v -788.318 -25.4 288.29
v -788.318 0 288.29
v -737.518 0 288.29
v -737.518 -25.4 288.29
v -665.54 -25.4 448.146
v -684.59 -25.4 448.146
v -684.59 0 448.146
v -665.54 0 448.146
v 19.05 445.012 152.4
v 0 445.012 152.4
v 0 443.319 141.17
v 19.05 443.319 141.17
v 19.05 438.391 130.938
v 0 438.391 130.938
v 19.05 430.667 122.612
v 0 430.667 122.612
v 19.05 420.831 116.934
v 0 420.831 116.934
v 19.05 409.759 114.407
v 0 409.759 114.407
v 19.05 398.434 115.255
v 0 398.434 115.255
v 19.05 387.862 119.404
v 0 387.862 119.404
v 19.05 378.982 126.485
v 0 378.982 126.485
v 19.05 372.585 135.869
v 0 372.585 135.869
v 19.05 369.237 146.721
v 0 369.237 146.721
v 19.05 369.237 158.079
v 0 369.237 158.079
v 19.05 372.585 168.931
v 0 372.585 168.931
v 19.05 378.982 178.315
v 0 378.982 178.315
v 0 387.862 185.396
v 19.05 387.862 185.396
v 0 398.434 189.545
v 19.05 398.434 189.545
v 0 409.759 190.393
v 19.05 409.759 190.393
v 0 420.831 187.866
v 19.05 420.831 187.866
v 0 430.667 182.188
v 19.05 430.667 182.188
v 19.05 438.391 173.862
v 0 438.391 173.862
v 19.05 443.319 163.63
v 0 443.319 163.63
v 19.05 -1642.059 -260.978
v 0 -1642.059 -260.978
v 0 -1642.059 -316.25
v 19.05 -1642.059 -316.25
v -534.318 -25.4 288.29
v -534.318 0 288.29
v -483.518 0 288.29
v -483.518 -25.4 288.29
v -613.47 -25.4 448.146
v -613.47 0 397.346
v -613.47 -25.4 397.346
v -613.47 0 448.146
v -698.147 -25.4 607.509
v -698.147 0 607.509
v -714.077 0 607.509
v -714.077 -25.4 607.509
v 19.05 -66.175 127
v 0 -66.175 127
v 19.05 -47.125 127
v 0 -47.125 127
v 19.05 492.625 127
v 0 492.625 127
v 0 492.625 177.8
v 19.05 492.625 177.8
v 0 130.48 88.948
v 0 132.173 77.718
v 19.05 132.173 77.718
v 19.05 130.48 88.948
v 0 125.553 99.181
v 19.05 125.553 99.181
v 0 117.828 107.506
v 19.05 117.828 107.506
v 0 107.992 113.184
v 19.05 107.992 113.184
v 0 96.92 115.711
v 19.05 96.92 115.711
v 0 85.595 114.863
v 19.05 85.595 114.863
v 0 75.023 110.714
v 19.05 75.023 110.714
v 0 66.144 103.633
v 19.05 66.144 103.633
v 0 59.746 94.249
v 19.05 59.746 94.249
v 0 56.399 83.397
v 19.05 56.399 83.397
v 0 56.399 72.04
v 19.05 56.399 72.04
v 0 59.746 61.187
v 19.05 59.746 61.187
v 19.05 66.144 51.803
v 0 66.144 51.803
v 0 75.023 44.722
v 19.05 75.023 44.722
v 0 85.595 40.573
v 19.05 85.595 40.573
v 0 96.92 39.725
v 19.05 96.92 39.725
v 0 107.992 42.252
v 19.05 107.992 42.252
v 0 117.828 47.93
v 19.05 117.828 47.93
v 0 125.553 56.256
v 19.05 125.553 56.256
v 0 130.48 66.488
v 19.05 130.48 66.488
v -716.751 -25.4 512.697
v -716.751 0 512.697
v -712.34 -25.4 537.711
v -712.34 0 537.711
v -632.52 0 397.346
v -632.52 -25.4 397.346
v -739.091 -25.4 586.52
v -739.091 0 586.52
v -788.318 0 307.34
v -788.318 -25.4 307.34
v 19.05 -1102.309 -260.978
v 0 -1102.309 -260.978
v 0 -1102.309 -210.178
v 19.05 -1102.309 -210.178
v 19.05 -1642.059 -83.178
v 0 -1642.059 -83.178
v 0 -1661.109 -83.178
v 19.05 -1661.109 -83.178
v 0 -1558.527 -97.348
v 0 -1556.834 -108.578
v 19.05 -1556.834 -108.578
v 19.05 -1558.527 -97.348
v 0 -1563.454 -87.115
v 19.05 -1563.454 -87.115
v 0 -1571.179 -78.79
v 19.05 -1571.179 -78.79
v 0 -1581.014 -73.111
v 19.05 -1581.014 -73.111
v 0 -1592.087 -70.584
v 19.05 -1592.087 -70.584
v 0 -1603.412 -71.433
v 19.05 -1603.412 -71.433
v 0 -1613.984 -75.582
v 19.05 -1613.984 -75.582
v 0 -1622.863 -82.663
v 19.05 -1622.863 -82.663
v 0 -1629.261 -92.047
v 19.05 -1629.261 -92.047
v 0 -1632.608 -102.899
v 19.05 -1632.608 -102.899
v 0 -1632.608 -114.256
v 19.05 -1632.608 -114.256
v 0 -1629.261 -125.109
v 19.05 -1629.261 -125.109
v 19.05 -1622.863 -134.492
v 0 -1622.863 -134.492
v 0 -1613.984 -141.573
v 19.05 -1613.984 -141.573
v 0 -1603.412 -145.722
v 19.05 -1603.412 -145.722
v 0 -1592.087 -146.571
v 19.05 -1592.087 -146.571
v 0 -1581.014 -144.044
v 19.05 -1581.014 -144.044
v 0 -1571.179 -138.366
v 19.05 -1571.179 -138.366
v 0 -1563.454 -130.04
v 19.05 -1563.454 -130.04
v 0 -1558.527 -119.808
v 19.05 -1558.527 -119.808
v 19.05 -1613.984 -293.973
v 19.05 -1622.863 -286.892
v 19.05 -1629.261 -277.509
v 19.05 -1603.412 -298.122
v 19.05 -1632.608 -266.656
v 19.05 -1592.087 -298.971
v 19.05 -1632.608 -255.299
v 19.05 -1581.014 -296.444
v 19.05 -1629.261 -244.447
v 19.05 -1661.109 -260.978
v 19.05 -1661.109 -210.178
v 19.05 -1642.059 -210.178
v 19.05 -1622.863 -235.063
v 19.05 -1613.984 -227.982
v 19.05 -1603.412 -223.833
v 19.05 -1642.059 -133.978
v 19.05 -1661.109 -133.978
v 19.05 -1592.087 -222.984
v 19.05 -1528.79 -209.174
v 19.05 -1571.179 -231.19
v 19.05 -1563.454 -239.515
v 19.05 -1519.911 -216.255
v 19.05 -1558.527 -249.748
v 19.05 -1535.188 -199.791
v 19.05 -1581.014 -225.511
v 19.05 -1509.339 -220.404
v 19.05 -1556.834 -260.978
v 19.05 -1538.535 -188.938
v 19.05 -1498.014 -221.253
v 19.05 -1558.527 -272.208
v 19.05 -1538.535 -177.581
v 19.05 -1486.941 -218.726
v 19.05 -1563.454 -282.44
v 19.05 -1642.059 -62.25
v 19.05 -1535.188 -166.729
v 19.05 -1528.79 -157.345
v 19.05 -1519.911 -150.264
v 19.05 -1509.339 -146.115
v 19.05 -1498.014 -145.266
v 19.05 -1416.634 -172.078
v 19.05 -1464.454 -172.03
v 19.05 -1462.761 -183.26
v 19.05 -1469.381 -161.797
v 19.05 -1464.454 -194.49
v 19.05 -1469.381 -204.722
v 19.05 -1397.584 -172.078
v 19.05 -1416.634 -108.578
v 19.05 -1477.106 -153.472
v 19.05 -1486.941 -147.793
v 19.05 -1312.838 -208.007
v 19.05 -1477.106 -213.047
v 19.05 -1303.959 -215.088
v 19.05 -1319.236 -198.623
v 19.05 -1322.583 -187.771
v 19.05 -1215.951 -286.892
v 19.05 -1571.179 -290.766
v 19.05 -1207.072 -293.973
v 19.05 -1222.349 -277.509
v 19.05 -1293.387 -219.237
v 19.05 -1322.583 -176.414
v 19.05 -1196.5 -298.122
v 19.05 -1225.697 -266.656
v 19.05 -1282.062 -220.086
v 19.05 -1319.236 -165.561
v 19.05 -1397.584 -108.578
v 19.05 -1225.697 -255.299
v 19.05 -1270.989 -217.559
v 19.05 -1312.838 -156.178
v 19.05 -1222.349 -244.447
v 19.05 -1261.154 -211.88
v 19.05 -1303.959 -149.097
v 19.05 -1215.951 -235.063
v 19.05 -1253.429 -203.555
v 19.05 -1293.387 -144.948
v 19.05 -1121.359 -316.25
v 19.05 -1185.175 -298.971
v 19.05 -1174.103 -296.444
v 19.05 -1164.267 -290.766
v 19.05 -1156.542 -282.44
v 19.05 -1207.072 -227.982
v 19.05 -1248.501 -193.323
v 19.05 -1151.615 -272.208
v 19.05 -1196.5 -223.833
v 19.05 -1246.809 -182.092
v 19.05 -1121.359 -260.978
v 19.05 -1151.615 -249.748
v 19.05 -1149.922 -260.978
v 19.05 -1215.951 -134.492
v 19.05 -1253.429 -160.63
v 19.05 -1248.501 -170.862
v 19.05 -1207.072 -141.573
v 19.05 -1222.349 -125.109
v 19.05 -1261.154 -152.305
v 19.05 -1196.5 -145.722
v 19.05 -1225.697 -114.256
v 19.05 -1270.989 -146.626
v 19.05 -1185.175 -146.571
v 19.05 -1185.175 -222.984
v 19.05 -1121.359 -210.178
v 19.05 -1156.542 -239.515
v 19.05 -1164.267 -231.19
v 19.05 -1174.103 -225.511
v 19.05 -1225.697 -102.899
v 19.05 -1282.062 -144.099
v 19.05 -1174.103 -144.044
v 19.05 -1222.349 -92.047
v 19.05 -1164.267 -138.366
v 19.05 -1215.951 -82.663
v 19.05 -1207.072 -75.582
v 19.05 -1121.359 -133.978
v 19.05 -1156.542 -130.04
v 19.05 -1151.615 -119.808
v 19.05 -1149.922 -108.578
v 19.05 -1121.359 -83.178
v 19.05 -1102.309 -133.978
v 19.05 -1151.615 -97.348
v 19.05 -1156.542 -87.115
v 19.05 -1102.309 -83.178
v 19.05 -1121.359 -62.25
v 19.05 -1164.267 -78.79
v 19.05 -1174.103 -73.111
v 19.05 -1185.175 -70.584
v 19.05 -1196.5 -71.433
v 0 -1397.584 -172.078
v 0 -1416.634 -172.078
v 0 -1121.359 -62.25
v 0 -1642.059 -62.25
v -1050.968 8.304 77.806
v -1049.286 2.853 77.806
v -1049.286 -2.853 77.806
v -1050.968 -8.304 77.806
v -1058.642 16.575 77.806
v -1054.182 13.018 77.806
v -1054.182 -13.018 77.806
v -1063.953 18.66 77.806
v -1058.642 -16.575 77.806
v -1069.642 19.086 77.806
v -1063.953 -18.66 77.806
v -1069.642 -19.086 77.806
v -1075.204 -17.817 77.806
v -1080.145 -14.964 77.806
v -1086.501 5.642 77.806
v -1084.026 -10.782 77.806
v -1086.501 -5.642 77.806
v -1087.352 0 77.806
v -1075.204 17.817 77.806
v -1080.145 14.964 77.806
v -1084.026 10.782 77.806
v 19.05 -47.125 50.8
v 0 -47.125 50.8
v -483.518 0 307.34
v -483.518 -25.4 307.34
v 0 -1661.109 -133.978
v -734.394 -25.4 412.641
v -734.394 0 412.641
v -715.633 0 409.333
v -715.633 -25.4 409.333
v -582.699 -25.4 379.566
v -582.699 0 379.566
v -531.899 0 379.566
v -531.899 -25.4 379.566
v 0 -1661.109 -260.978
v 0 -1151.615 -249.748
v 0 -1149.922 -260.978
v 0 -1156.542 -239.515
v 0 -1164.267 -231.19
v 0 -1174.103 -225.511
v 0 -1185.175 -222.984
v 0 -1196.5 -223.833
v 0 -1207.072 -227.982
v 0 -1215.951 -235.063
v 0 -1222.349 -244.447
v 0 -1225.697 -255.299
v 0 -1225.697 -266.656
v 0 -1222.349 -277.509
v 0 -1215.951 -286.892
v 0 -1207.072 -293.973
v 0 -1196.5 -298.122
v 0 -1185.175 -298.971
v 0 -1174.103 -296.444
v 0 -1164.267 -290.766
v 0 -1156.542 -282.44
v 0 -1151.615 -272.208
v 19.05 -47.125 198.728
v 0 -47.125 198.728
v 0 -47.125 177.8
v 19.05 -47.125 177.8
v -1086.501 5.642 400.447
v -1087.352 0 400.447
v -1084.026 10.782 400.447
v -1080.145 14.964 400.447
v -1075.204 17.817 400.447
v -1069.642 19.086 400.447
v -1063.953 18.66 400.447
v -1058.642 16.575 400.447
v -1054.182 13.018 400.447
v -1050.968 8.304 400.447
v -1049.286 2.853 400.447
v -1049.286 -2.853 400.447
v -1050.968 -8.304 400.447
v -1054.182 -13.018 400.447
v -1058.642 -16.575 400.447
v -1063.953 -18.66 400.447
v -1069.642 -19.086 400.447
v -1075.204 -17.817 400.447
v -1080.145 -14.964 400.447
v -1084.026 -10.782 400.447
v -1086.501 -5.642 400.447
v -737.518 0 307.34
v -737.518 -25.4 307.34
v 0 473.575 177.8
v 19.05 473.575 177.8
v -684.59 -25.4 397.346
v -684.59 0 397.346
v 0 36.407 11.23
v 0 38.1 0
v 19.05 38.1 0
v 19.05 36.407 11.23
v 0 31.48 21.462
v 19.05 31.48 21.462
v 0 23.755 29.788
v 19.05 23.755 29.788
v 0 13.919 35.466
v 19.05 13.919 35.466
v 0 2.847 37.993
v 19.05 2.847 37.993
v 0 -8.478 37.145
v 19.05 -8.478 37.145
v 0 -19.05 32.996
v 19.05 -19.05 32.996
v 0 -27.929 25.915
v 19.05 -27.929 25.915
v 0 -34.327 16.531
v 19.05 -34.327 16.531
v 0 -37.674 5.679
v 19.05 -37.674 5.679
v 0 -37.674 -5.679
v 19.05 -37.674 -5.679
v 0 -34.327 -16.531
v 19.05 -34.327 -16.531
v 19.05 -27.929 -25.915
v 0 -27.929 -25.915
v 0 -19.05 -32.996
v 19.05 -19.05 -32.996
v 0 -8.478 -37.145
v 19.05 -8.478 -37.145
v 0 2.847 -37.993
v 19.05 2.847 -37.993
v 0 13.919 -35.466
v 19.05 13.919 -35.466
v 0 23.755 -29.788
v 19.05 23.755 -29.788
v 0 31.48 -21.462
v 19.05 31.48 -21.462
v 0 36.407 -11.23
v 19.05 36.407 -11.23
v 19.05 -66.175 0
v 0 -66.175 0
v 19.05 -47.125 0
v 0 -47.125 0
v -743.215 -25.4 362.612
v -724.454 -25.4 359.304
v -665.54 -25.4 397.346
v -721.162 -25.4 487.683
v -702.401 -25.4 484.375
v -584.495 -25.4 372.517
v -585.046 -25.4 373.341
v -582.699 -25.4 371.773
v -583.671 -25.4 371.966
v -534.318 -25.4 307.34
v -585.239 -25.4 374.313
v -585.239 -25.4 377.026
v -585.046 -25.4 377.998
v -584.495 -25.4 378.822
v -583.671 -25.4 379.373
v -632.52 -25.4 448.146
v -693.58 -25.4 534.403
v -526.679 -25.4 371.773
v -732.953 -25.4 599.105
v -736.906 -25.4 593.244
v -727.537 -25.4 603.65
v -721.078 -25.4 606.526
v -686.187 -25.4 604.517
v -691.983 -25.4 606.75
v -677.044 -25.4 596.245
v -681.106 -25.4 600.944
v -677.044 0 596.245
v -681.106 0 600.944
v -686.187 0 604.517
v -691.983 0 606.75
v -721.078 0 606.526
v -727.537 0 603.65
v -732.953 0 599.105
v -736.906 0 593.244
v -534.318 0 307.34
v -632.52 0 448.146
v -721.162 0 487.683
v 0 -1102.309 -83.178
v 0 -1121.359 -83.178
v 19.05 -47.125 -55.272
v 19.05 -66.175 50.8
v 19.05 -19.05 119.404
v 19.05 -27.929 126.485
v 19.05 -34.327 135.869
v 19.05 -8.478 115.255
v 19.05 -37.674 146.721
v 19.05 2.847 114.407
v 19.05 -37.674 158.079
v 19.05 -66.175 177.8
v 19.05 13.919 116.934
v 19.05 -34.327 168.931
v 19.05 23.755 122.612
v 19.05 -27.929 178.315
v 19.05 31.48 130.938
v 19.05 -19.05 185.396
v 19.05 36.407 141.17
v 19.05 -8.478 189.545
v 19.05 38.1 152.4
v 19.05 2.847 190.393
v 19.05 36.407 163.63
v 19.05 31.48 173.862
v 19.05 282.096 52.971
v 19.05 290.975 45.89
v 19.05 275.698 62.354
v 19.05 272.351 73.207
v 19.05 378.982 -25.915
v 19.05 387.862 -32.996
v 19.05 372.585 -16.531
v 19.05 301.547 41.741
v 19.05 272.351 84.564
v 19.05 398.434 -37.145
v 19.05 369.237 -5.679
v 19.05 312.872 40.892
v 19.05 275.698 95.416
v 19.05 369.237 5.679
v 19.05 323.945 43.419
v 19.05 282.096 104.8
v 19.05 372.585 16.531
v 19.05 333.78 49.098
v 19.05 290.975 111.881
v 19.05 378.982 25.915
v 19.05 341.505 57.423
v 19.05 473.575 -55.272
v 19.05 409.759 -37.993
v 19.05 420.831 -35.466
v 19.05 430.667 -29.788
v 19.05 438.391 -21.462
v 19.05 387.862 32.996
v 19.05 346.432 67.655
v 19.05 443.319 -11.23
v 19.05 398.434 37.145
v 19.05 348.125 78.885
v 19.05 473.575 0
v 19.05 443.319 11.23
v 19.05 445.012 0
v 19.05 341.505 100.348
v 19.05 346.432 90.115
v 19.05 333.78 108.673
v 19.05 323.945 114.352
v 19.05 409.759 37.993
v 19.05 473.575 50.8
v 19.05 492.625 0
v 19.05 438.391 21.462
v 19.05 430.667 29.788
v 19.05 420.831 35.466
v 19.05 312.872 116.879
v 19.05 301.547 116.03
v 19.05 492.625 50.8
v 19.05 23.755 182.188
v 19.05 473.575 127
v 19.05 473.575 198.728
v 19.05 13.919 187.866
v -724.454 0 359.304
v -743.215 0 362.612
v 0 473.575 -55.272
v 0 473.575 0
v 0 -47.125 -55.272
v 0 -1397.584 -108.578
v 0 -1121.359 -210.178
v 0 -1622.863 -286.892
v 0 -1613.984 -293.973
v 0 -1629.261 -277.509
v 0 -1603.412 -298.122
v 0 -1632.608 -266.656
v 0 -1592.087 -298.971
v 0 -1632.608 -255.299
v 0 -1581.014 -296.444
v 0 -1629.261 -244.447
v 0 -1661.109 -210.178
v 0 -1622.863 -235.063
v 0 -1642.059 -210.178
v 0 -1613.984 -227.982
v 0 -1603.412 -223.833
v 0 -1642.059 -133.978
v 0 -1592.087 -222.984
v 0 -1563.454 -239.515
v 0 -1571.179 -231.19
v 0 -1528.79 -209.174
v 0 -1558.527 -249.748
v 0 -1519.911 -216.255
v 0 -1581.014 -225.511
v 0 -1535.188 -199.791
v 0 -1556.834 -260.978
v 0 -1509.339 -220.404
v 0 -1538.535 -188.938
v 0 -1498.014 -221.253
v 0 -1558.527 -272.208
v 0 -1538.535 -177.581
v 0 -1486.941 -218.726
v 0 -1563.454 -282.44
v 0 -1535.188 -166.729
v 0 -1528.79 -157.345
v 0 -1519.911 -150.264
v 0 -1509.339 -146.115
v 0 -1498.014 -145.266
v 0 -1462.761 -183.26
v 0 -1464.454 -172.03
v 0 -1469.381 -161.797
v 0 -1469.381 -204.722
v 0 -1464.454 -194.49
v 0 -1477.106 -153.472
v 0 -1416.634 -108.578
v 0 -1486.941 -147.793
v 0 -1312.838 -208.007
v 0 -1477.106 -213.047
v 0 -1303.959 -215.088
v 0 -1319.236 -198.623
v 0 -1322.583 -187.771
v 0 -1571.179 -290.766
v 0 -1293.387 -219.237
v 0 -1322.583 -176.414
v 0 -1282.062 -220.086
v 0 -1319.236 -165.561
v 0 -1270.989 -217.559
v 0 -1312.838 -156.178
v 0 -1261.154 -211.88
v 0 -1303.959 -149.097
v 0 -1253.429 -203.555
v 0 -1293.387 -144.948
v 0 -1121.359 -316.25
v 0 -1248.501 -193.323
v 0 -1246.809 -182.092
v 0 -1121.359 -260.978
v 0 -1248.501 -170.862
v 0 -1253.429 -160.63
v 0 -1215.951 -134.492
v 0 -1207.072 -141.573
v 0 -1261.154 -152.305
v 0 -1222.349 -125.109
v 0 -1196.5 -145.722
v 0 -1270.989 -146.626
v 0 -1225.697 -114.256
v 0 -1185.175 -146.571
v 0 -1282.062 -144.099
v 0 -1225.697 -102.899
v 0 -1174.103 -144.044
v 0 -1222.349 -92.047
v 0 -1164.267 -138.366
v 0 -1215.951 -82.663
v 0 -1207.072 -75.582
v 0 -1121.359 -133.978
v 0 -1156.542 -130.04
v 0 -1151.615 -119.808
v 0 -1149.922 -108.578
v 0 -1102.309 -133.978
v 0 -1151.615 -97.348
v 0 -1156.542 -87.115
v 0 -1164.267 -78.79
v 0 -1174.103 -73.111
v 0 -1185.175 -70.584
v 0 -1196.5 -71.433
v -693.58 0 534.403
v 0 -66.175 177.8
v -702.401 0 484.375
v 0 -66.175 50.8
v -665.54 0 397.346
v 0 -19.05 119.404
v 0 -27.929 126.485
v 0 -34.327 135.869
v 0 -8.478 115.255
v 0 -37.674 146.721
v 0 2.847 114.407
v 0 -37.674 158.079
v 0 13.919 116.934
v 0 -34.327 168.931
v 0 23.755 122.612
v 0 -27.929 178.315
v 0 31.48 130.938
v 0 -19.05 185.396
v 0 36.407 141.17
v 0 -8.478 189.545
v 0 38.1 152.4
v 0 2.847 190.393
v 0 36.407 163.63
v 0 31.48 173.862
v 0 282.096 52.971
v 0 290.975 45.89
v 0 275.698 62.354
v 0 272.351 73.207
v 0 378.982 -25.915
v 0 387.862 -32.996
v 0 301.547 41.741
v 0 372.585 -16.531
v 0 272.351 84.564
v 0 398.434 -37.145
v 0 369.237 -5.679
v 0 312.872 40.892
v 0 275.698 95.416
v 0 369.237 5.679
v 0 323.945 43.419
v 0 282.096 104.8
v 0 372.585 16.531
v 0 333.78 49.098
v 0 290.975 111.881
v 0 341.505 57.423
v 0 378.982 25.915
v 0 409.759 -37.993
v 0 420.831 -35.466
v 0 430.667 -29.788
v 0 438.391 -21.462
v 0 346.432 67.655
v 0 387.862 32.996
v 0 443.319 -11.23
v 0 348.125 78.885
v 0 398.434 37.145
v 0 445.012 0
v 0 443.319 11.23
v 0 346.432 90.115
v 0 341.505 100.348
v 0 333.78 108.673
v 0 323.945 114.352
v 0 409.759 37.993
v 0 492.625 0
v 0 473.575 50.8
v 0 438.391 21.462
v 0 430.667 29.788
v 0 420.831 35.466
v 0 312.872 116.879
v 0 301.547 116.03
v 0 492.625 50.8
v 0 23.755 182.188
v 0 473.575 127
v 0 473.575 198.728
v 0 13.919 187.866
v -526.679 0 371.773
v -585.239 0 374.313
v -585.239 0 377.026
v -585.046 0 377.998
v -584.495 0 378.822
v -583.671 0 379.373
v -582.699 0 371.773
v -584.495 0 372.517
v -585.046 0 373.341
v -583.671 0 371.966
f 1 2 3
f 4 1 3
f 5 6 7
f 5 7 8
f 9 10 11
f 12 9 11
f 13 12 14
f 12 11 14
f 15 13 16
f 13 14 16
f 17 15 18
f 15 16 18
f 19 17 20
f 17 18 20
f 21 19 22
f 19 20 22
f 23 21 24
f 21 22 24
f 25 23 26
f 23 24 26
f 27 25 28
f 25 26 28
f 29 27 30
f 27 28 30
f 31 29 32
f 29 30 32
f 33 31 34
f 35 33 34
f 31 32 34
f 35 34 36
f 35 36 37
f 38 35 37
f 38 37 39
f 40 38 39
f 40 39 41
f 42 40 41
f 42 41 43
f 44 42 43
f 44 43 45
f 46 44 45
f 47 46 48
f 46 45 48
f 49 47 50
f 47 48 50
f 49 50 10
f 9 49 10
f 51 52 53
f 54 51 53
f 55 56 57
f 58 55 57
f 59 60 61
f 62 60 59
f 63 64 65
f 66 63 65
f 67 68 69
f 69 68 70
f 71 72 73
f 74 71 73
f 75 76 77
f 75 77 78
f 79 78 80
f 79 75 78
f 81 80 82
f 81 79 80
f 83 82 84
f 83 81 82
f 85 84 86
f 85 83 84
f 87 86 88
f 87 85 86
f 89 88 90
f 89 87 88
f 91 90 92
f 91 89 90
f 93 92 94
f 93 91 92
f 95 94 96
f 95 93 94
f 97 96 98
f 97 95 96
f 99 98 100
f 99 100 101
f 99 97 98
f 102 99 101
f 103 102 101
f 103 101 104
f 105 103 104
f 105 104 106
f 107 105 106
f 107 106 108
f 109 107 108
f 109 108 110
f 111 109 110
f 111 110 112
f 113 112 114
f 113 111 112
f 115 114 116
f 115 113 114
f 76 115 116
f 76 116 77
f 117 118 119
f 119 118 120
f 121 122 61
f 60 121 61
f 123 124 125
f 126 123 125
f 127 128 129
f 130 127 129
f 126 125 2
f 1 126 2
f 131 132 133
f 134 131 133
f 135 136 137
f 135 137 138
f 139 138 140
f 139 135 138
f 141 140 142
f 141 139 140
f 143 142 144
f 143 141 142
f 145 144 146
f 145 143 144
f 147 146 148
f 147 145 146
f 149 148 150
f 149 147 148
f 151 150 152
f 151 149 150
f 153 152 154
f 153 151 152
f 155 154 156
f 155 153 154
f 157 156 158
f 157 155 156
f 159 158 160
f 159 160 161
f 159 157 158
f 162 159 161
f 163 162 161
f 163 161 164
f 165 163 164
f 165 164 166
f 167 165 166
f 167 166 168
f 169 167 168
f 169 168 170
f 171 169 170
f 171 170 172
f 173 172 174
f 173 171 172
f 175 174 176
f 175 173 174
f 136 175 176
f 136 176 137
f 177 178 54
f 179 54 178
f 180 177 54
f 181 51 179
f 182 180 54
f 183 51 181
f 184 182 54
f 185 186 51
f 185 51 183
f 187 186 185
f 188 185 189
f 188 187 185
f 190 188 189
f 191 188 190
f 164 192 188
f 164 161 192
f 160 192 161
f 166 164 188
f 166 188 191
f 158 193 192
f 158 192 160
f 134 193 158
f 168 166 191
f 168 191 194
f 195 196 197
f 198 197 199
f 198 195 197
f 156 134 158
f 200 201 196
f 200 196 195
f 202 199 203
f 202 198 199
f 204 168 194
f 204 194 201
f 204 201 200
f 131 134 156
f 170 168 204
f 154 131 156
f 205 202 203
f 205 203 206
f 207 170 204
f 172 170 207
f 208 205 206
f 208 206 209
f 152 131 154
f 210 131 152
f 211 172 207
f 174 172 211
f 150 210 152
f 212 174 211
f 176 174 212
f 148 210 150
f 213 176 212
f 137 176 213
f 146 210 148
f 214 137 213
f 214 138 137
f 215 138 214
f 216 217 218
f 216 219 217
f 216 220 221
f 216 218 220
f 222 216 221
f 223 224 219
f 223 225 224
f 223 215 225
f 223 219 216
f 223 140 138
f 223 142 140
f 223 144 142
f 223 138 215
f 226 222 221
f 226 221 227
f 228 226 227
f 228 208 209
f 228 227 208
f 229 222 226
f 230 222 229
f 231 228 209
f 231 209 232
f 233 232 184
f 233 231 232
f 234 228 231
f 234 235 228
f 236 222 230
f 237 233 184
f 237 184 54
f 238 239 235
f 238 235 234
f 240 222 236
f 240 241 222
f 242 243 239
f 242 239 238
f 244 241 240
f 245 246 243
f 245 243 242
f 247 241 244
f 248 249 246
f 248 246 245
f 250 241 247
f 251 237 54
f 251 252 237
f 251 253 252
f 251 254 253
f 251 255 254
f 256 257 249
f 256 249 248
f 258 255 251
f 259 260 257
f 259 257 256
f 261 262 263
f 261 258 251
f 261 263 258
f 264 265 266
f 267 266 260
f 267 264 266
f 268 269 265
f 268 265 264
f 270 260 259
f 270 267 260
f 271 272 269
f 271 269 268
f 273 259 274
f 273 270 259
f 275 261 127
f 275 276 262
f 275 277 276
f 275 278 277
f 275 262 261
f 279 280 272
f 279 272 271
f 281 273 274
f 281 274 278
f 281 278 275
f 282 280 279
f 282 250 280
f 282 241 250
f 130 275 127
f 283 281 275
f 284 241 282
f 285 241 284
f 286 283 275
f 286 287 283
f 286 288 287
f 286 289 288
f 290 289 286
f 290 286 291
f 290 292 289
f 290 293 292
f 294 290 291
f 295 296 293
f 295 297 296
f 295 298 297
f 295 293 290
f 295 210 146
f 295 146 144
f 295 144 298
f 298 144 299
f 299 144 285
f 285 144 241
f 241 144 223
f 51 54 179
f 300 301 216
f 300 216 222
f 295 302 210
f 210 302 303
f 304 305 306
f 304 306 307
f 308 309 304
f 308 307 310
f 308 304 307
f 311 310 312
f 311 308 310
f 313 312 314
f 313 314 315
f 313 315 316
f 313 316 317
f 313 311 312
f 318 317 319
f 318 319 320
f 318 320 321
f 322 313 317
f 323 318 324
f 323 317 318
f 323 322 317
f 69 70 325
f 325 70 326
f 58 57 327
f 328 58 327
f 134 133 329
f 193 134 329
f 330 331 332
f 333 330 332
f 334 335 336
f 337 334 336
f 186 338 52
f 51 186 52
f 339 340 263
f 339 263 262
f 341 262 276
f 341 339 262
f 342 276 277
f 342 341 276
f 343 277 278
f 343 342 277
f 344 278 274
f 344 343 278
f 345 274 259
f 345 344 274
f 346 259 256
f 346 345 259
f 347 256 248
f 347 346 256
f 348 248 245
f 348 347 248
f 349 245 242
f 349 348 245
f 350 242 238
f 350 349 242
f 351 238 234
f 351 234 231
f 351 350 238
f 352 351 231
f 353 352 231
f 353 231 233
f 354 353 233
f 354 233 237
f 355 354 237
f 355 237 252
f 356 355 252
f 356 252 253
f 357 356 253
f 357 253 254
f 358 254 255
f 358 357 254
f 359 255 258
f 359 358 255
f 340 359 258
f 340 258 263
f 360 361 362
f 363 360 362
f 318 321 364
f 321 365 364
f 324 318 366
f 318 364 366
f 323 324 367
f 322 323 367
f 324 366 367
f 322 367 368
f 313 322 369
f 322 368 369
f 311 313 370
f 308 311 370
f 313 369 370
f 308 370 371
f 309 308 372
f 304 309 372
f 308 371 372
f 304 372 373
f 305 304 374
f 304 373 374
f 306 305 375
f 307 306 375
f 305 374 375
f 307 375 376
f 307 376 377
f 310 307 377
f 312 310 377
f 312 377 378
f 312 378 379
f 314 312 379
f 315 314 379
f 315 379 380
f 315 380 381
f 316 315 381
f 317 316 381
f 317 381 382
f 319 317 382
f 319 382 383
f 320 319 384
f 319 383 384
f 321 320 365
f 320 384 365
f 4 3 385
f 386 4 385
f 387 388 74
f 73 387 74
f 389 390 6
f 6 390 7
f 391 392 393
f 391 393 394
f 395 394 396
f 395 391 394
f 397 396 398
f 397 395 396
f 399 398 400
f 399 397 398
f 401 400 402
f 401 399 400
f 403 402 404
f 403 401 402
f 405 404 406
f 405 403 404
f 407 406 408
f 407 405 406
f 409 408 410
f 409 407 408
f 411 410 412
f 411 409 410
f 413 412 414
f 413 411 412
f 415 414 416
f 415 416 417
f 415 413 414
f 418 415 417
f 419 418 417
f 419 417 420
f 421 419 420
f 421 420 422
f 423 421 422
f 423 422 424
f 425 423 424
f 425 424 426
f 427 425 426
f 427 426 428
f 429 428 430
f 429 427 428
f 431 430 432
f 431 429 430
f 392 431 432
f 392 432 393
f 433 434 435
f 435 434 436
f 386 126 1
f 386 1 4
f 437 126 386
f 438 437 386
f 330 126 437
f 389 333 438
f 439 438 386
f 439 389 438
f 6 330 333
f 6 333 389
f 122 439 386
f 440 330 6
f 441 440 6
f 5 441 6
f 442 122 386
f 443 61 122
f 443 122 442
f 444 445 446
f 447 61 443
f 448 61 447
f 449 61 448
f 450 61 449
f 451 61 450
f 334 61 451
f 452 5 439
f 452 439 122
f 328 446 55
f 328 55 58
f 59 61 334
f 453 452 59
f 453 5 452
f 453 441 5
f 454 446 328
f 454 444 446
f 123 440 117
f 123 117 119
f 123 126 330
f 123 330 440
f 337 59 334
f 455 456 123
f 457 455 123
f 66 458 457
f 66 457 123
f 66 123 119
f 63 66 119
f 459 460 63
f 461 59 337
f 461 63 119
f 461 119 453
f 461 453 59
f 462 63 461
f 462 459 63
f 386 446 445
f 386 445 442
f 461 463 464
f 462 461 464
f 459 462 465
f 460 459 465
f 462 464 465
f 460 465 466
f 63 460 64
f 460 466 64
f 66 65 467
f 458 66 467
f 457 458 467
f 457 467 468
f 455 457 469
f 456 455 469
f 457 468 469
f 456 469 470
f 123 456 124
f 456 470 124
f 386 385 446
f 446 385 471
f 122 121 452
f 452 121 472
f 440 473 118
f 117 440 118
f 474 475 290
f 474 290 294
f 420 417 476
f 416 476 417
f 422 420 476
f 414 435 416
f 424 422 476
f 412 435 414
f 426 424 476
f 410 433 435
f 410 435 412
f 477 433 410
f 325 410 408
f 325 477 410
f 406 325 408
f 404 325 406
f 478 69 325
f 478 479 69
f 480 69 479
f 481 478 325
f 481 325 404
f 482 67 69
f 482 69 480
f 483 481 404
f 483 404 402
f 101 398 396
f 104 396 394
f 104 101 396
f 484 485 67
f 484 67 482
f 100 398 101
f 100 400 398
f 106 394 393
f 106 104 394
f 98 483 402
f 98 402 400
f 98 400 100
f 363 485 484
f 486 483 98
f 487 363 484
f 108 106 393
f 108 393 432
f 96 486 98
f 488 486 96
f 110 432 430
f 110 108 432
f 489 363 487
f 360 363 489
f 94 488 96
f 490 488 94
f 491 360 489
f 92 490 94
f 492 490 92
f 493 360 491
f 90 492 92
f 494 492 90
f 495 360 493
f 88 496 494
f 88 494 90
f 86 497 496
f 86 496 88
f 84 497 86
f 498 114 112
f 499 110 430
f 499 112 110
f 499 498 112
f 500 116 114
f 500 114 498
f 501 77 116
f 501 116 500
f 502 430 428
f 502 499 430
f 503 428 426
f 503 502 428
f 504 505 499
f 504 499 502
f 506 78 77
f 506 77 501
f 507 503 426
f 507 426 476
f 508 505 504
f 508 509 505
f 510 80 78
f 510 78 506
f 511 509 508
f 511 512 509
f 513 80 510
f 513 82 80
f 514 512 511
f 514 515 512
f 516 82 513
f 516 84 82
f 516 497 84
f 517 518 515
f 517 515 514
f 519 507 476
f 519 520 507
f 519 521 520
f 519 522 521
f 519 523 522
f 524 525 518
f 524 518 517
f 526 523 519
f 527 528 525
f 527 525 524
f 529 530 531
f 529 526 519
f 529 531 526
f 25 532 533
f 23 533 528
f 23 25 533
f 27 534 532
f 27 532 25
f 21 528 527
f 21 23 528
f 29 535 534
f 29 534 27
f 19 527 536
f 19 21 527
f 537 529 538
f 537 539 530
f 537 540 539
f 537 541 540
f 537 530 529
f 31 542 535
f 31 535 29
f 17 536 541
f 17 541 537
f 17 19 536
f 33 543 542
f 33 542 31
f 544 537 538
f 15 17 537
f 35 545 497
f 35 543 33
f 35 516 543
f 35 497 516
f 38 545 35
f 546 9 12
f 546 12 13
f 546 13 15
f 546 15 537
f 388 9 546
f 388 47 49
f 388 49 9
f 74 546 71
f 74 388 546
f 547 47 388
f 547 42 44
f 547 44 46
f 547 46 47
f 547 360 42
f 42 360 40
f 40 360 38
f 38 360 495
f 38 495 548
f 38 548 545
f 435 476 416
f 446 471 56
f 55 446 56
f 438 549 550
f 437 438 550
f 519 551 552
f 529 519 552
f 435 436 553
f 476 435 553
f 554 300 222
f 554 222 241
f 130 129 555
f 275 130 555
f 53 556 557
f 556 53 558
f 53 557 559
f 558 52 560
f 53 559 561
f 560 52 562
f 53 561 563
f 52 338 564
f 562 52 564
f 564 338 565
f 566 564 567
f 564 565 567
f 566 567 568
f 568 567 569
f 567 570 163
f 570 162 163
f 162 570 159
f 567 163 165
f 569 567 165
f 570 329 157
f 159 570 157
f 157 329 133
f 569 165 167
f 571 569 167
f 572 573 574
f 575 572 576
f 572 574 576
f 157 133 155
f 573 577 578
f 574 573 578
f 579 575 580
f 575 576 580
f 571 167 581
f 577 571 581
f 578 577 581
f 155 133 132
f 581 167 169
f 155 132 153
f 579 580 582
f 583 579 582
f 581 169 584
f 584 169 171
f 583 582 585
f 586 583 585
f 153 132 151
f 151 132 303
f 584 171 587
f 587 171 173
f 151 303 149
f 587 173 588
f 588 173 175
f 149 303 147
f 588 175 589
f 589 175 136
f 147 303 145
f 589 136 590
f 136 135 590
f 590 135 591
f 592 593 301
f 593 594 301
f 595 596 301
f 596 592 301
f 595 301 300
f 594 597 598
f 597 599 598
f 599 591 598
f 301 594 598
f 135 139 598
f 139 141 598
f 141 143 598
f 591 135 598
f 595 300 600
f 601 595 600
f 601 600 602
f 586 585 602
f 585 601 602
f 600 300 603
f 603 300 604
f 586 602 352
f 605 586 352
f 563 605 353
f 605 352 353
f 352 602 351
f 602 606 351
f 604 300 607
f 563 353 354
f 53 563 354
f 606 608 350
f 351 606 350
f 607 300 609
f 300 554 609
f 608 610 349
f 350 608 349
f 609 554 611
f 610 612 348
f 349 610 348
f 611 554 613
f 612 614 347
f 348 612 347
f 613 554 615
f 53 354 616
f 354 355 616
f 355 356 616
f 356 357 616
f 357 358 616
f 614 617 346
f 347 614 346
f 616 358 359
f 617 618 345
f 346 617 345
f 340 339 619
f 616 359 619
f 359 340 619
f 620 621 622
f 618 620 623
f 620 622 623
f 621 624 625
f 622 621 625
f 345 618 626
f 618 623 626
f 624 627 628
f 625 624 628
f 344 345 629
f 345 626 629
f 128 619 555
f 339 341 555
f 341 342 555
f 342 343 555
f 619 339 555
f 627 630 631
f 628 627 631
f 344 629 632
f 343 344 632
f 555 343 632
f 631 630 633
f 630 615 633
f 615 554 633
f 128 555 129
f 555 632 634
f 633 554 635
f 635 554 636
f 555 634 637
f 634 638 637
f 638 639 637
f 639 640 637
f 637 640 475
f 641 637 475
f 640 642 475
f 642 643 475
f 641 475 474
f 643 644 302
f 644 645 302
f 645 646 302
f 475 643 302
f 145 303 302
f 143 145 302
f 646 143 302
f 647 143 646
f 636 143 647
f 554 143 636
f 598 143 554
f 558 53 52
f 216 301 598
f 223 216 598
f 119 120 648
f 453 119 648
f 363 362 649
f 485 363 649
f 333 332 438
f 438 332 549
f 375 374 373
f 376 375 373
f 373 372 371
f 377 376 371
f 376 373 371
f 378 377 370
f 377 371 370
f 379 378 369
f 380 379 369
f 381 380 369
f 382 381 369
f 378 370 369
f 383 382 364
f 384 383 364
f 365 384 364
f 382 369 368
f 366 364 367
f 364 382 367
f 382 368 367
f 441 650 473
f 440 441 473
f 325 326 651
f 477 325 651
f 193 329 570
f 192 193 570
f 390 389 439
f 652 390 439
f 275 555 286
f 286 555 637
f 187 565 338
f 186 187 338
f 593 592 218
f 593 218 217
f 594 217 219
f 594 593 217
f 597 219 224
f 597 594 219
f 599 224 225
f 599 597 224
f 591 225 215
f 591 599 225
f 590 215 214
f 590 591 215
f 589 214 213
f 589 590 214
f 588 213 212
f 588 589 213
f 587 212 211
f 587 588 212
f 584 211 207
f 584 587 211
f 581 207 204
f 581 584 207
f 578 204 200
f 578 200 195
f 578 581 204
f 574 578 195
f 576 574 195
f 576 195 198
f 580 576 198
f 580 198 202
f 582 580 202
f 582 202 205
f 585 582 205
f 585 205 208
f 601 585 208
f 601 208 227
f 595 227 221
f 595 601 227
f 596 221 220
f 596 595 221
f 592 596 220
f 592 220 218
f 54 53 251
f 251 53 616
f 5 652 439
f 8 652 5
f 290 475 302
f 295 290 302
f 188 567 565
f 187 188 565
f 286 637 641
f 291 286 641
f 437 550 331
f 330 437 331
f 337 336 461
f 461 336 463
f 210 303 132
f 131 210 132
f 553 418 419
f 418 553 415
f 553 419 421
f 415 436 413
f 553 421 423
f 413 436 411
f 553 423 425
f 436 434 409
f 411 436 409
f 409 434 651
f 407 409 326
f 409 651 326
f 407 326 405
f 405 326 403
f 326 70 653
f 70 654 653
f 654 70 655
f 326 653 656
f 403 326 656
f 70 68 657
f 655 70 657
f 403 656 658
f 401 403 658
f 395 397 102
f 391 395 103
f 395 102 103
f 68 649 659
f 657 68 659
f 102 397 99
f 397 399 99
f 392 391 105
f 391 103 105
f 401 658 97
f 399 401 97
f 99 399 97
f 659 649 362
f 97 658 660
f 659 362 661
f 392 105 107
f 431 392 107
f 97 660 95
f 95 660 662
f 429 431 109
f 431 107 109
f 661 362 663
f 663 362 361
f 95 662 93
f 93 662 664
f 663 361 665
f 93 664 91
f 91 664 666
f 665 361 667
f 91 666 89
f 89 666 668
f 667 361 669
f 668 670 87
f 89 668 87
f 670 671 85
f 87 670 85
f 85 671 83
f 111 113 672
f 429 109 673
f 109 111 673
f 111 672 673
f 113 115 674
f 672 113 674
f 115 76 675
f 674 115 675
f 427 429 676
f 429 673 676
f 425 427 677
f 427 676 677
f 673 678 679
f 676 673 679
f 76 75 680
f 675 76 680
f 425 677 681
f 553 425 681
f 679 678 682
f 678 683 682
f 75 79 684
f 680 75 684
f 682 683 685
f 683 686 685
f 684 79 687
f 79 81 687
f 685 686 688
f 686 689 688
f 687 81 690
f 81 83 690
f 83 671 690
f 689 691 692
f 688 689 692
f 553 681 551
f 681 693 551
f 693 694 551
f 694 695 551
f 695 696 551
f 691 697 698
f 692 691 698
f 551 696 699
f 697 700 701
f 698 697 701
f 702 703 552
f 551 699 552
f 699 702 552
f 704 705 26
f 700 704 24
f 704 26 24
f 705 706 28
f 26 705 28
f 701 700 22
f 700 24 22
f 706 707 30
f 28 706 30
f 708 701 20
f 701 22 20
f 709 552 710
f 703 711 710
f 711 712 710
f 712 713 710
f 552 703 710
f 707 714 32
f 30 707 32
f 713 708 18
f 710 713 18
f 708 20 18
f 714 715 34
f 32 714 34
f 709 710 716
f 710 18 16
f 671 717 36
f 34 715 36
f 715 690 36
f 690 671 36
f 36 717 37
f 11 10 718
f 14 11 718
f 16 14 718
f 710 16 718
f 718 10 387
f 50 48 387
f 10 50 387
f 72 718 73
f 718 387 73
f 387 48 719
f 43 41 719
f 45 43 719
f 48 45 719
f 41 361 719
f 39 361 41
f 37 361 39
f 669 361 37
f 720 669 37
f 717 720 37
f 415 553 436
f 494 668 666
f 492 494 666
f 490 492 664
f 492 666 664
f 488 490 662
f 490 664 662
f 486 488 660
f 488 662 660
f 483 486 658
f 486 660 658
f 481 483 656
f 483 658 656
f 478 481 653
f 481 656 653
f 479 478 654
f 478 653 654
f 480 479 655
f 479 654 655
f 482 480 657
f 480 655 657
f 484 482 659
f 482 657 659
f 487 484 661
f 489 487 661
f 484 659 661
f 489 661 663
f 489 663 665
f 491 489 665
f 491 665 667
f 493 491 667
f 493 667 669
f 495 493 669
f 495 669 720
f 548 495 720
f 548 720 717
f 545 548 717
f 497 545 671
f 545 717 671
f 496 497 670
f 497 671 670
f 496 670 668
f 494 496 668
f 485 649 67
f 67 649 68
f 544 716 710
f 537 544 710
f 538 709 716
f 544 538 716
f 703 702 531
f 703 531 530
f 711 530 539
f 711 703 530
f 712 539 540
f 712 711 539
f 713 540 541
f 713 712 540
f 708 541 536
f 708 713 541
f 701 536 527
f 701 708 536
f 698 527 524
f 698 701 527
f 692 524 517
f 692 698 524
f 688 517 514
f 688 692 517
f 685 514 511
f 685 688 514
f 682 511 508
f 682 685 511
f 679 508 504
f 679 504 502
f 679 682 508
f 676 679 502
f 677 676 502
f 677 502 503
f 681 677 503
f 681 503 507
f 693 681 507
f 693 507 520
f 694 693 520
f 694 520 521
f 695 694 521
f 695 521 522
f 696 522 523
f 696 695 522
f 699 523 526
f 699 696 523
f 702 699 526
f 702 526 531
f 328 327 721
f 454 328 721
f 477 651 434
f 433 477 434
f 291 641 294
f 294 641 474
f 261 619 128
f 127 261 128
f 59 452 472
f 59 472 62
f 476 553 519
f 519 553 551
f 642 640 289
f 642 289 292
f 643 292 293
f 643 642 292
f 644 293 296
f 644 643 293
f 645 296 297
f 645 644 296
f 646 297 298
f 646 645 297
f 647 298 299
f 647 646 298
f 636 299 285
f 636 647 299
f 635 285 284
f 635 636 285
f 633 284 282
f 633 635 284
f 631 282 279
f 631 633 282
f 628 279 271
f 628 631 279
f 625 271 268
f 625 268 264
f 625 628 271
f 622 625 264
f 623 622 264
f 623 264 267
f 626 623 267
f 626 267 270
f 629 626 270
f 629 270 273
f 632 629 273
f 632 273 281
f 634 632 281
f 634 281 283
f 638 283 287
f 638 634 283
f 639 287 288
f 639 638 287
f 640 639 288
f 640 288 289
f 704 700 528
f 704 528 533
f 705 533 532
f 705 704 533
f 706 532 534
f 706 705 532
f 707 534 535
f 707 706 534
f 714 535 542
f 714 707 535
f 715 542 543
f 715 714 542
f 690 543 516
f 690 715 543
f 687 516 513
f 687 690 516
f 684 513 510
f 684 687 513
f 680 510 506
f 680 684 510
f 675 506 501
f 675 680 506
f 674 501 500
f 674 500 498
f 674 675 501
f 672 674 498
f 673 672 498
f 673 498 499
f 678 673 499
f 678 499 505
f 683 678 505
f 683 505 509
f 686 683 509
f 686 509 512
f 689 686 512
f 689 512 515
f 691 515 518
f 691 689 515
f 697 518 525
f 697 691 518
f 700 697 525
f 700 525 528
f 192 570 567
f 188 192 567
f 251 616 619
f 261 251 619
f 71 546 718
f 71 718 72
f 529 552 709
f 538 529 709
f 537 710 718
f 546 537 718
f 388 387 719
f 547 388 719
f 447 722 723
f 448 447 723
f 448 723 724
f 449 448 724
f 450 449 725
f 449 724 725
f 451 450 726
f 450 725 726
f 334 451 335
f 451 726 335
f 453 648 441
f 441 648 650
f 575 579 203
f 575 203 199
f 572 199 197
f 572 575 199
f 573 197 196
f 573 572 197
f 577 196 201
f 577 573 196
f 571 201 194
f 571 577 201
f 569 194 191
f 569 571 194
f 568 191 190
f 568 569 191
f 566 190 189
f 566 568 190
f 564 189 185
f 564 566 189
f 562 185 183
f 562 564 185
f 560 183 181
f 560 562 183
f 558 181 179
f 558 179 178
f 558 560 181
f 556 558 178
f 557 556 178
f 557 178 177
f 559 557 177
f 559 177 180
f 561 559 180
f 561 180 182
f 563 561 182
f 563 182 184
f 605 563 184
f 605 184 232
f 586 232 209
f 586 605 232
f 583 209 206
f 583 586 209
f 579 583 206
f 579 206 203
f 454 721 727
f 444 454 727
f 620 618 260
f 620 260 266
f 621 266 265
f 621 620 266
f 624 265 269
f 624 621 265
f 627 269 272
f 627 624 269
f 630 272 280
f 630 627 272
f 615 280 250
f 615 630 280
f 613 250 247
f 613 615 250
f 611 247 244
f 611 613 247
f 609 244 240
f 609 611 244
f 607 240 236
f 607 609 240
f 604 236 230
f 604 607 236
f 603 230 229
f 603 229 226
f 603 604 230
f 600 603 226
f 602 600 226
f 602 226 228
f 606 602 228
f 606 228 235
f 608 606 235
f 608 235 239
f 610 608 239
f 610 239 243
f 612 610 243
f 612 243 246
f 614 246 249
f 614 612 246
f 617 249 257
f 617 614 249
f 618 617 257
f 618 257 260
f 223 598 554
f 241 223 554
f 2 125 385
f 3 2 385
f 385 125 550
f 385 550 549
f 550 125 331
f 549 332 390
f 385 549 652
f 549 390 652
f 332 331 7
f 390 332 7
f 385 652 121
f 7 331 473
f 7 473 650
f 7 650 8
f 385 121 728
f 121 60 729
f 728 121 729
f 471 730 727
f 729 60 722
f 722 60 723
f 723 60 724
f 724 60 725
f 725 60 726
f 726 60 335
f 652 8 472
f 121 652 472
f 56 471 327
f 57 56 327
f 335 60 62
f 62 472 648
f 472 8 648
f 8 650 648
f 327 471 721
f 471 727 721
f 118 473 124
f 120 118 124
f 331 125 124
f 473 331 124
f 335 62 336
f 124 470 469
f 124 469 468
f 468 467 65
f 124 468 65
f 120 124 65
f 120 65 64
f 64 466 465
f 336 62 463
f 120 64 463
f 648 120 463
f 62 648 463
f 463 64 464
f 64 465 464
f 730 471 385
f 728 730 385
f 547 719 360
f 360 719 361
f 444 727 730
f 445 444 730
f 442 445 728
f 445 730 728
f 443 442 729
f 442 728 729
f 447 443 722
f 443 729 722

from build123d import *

# Parameters (mm, degrees)
F2_W     = 19.139648
F2_H     = 322.640807
F0_W     = 19.05
F0_H     = 50.8
F4_DEPTH = 25.4
F1_W     = 19.05
F1_H     = 25.4
F1_R     = 38.1
F1_H_2   = 63.5
F1_H_3   = 50.8
F5_DEPTH = 19.05


with BuildPart() as f3:
    # F2 (on Front) → F3 (revolve)
    with BuildSketch(Plane.XZ):
        with Locations((-1077.781737, 239.126637)):
            Rectangle(F2_W, F2_H)
    revolve(axis=Axis((-1068.211913, 0, 239.126638), (0, 0, -1)))


with BuildPart() as f4:
    # F0 (on Front) → F4 (new body)
    with BuildSketch(Plane.XZ):
        with BuildLine():
            Line((-737.51774, 288.290056), (-737.51774, 307.340056))
            Line((-737.51774, 307.340056), (-534.31774, 307.340056))
            Line((-534.31774, 307.340056), (-534.31774, 288.290056))
            Line((-534.31774, 288.290056), (-483.51774, 288.290056))
            Line((-483.51774, 288.290056), (-483.51774, 307.340056))
            Line((-483.51774, 307.340056), (-526.678775, 371.772796))
            Line((-526.678775, 371.772796), (-582.699424, 371.772796))
            ThreePointArc((-582.699424, 371.772796), (-584.495476, 372.516745), (-585.239424, 374.312796))
            Line((-585.239424, 374.312796), (-585.239424, 377.026416))
            ThreePointArc((-585.239424, 377.026416), (-584.495476, 378.822467), (-582.699424, 379.566416))
            Line((-582.699424, 379.566416), (-557.299424, 379.566416))
            Line((-557.299424, 379.566416), (-531.899424, 379.566416))
            Line((-531.899424, 379.566416), (-677.044472, 596.24549))
            ThreePointArc((-677.044472, 596.24549), (-686.186926, 604.517216), (-698.147378, 607.509459))
            Line((-698.147378, 607.509459), (-714.076645, 607.509459))
            ThreePointArc((-714.076645, 607.509459), (-730.40345, 601.566988), (-739.090762, 586.520123))
            Line((-739.090762, 586.520123), (-788.31774, 307.340056))
            Line((-788.31774, 307.340056), (-788.31774, 288.290056))
            Line((-788.31774, 288.290056), (-737.51774, 288.290056))
        make_face()
        Polygon((-734.393691, 412.640675), (-715.633104, 409.332677), (-724.454431, 359.304443), (-743.215019, 362.612441), align=None, mode=Mode.SUBTRACT)
        with Locations((-675.064775, 422.746406)):
            Rectangle(F0_W, F0_H, mode=Mode.SUBTRACT)
        with Locations((-622.994775, 422.746406)):
            Rectangle(F0_W, F0_H, mode=Mode.SUBTRACT)
        Polygon((-716.751037, 512.697143), (-712.340373, 537.71126), (-693.579785, 534.403262), (-702.401113, 484.375028), (-721.1617, 487.683026), align=None, mode=Mode.SUBTRACT)
    extrude(amount=F4_DEPTH)


with BuildPart() as f5:
    # F1 (on Right) → F5 (new body)
    with BuildSketch(Plane.YZ):
        with BuildLine():
            Line((473.575031, 177.8), (473.575031, 198.727619))
            Line((473.575031, 198.727619), (213.225031, 198.727619))
            Line((213.225031, 198.727619), (213.225031, 152.4))
            Line((213.225031, 152.4), (368.811731, 152.4))
            ThreePointArc((368.811731, 152.4), (406.911731, 190.5), (445.011731, 152.4))
            Line((445.011731, 152.4), (473.575031, 152.4))
            Line((473.575031, 152.4), (473.575031, 177.8))
        make_face()
        with BuildLine():
            Line((213.225031, 152.4), (213.225031, 198.727619))
            Line((213.225031, 198.727619), (-47.124969, 198.727619))
            Line((-47.124969, 198.727619), (-47.124969, 177.8))
            Line((-47.124969, 177.8), (-66.174969, 177.8))
            Line((-66.174969, 177.8), (-66.174969, 152.4))
            Line((-66.174969, 152.4), (-38.1, 152.4))
            ThreePointArc((-38.1, 152.4), (0, 190.5), (38.1, 152.4))
            Line((38.1, 152.4), (213.225031, 152.4))
        make_face()
        with Locations((483.100031, 165.1)):
            Rectangle(F1_W, F1_H)
        with BuildLine():
            Line((368.811731, 152.4), (213.225031, 152.4))
            Line((213.225031, 152.4), (213.225031, -55.272381))
            Line((213.225031, -55.272381), (473.575031, -55.272381))
            Line((473.575031, -55.272381), (473.575031, 0))
            Line((473.575031, 0), (492.625031, 0))
            Line((492.625031, 0), (492.625031, 50.8))
            Line((492.625031, 50.8), (473.575031, 50.8))
            Line((473.575031, 50.8), (473.575031, 127))
            Line((473.575031, 127), (473.575031, 152.4))
            Line((473.575031, 152.4), (445.011731, 152.4))
            ThreePointArc((445.011731, 152.4), (406.911731, 114.3), (368.811731, 152.4))
        make_face()
        with Locations((406.911731, 0)):
            Circle(F1_R, mode=Mode.SUBTRACT)
        with Locations((310.025126, 78.885317)):
            Circle(F1_R, mode=Mode.SUBTRACT)
        with BuildLine():
            Line((213.225031, -55.272381), (213.225031, 152.4))
            Line((213.225031, 152.4), (38.1, 152.4))
            ThreePointArc((38.1, 152.4), (0, 114.3), (-38.1, 152.4))
            Line((-38.1, 152.4), (-66.174969, 152.4))
            Line((-66.174969, 152.4), (-66.174969, 127))
            Line((-66.174969, 127), (-47.124969, 127))
            Line((-47.124969, 127), (-47.124969, 50.8))
            Line((-47.124969, 50.8), (-66.174969, 50.8))
            Line((-66.174969, 50.8), (-66.174969, 0))
            Line((-66.174969, 0), (-47.124969, 0))
            Line((-47.124969, 0), (-47.124969, -55.272381))
            Line((-47.124969, -55.272381), (213.225031, -55.272381))
        make_face()
        Circle(F1_R, mode=Mode.SUBTRACT)
        with Locations((94.07299, 77.718012)):
            Circle(F1_R, mode=Mode.SUBTRACT)
        with Locations((483.100031, 139.7)):
            Rectangle(F1_W, F1_H)
        Polygon((-1121.358874, -83.177725), (-1121.358874, -62.250106), (-1381.708874, -62.250106), (-1381.708874, -316.250106), (-1121.358874, -316.250106), (-1121.358874, -260.977725), (-1102.308874, -260.977725), (-1102.308874, -210.177725), (-1121.358874, -210.177725), (-1121.358874, -133.977725), align=None)
        with Locations((-1188.022175, -260.977725)):
            Circle(F1_R, mode=Mode.SUBTRACT)
        with Locations((-1284.90878, -182.092408)):
            Circle(F1_R, mode=Mode.SUBTRACT)
        with Locations((-1188.022175, -108.577725)):
            Circle(F1_R, mode=Mode.SUBTRACT)
        Polygon((-1381.708874, -316.250106), (-1381.708874, -62.250106), (-1642.058874, -62.250106), (-1642.058874, -83.177725), (-1661.108874, -83.177725), (-1661.108874, -133.977725), (-1642.058874, -133.977725), (-1642.058874, -210.177725), (-1661.108874, -210.177725), (-1661.108874, -260.977725), (-1642.058874, -260.977725), (-1642.058874, -316.250106), align=None)
        with Locations((-1594.933906, -260.977725)):
            Circle(F1_R, mode=Mode.SUBTRACT)
        with Locations((-1500.860915, -183.259713)):
            Circle(F1_R, mode=Mode.SUBTRACT)
        with Locations((-1407.108725, -140.32773)):
            Rectangle(F1_W, F1_H_2, mode=Mode.SUBTRACT)
        with Locations((-1594.933906, -108.577725)):
            Circle(F1_R, mode=Mode.SUBTRACT)
        with Locations((-1111.833874, -108.577725)):
            Rectangle(F1_W, F1_H_3)
    extrude(amount=F5_DEPTH)


solid = Compound([f3.part, f4.part, f5.part])
